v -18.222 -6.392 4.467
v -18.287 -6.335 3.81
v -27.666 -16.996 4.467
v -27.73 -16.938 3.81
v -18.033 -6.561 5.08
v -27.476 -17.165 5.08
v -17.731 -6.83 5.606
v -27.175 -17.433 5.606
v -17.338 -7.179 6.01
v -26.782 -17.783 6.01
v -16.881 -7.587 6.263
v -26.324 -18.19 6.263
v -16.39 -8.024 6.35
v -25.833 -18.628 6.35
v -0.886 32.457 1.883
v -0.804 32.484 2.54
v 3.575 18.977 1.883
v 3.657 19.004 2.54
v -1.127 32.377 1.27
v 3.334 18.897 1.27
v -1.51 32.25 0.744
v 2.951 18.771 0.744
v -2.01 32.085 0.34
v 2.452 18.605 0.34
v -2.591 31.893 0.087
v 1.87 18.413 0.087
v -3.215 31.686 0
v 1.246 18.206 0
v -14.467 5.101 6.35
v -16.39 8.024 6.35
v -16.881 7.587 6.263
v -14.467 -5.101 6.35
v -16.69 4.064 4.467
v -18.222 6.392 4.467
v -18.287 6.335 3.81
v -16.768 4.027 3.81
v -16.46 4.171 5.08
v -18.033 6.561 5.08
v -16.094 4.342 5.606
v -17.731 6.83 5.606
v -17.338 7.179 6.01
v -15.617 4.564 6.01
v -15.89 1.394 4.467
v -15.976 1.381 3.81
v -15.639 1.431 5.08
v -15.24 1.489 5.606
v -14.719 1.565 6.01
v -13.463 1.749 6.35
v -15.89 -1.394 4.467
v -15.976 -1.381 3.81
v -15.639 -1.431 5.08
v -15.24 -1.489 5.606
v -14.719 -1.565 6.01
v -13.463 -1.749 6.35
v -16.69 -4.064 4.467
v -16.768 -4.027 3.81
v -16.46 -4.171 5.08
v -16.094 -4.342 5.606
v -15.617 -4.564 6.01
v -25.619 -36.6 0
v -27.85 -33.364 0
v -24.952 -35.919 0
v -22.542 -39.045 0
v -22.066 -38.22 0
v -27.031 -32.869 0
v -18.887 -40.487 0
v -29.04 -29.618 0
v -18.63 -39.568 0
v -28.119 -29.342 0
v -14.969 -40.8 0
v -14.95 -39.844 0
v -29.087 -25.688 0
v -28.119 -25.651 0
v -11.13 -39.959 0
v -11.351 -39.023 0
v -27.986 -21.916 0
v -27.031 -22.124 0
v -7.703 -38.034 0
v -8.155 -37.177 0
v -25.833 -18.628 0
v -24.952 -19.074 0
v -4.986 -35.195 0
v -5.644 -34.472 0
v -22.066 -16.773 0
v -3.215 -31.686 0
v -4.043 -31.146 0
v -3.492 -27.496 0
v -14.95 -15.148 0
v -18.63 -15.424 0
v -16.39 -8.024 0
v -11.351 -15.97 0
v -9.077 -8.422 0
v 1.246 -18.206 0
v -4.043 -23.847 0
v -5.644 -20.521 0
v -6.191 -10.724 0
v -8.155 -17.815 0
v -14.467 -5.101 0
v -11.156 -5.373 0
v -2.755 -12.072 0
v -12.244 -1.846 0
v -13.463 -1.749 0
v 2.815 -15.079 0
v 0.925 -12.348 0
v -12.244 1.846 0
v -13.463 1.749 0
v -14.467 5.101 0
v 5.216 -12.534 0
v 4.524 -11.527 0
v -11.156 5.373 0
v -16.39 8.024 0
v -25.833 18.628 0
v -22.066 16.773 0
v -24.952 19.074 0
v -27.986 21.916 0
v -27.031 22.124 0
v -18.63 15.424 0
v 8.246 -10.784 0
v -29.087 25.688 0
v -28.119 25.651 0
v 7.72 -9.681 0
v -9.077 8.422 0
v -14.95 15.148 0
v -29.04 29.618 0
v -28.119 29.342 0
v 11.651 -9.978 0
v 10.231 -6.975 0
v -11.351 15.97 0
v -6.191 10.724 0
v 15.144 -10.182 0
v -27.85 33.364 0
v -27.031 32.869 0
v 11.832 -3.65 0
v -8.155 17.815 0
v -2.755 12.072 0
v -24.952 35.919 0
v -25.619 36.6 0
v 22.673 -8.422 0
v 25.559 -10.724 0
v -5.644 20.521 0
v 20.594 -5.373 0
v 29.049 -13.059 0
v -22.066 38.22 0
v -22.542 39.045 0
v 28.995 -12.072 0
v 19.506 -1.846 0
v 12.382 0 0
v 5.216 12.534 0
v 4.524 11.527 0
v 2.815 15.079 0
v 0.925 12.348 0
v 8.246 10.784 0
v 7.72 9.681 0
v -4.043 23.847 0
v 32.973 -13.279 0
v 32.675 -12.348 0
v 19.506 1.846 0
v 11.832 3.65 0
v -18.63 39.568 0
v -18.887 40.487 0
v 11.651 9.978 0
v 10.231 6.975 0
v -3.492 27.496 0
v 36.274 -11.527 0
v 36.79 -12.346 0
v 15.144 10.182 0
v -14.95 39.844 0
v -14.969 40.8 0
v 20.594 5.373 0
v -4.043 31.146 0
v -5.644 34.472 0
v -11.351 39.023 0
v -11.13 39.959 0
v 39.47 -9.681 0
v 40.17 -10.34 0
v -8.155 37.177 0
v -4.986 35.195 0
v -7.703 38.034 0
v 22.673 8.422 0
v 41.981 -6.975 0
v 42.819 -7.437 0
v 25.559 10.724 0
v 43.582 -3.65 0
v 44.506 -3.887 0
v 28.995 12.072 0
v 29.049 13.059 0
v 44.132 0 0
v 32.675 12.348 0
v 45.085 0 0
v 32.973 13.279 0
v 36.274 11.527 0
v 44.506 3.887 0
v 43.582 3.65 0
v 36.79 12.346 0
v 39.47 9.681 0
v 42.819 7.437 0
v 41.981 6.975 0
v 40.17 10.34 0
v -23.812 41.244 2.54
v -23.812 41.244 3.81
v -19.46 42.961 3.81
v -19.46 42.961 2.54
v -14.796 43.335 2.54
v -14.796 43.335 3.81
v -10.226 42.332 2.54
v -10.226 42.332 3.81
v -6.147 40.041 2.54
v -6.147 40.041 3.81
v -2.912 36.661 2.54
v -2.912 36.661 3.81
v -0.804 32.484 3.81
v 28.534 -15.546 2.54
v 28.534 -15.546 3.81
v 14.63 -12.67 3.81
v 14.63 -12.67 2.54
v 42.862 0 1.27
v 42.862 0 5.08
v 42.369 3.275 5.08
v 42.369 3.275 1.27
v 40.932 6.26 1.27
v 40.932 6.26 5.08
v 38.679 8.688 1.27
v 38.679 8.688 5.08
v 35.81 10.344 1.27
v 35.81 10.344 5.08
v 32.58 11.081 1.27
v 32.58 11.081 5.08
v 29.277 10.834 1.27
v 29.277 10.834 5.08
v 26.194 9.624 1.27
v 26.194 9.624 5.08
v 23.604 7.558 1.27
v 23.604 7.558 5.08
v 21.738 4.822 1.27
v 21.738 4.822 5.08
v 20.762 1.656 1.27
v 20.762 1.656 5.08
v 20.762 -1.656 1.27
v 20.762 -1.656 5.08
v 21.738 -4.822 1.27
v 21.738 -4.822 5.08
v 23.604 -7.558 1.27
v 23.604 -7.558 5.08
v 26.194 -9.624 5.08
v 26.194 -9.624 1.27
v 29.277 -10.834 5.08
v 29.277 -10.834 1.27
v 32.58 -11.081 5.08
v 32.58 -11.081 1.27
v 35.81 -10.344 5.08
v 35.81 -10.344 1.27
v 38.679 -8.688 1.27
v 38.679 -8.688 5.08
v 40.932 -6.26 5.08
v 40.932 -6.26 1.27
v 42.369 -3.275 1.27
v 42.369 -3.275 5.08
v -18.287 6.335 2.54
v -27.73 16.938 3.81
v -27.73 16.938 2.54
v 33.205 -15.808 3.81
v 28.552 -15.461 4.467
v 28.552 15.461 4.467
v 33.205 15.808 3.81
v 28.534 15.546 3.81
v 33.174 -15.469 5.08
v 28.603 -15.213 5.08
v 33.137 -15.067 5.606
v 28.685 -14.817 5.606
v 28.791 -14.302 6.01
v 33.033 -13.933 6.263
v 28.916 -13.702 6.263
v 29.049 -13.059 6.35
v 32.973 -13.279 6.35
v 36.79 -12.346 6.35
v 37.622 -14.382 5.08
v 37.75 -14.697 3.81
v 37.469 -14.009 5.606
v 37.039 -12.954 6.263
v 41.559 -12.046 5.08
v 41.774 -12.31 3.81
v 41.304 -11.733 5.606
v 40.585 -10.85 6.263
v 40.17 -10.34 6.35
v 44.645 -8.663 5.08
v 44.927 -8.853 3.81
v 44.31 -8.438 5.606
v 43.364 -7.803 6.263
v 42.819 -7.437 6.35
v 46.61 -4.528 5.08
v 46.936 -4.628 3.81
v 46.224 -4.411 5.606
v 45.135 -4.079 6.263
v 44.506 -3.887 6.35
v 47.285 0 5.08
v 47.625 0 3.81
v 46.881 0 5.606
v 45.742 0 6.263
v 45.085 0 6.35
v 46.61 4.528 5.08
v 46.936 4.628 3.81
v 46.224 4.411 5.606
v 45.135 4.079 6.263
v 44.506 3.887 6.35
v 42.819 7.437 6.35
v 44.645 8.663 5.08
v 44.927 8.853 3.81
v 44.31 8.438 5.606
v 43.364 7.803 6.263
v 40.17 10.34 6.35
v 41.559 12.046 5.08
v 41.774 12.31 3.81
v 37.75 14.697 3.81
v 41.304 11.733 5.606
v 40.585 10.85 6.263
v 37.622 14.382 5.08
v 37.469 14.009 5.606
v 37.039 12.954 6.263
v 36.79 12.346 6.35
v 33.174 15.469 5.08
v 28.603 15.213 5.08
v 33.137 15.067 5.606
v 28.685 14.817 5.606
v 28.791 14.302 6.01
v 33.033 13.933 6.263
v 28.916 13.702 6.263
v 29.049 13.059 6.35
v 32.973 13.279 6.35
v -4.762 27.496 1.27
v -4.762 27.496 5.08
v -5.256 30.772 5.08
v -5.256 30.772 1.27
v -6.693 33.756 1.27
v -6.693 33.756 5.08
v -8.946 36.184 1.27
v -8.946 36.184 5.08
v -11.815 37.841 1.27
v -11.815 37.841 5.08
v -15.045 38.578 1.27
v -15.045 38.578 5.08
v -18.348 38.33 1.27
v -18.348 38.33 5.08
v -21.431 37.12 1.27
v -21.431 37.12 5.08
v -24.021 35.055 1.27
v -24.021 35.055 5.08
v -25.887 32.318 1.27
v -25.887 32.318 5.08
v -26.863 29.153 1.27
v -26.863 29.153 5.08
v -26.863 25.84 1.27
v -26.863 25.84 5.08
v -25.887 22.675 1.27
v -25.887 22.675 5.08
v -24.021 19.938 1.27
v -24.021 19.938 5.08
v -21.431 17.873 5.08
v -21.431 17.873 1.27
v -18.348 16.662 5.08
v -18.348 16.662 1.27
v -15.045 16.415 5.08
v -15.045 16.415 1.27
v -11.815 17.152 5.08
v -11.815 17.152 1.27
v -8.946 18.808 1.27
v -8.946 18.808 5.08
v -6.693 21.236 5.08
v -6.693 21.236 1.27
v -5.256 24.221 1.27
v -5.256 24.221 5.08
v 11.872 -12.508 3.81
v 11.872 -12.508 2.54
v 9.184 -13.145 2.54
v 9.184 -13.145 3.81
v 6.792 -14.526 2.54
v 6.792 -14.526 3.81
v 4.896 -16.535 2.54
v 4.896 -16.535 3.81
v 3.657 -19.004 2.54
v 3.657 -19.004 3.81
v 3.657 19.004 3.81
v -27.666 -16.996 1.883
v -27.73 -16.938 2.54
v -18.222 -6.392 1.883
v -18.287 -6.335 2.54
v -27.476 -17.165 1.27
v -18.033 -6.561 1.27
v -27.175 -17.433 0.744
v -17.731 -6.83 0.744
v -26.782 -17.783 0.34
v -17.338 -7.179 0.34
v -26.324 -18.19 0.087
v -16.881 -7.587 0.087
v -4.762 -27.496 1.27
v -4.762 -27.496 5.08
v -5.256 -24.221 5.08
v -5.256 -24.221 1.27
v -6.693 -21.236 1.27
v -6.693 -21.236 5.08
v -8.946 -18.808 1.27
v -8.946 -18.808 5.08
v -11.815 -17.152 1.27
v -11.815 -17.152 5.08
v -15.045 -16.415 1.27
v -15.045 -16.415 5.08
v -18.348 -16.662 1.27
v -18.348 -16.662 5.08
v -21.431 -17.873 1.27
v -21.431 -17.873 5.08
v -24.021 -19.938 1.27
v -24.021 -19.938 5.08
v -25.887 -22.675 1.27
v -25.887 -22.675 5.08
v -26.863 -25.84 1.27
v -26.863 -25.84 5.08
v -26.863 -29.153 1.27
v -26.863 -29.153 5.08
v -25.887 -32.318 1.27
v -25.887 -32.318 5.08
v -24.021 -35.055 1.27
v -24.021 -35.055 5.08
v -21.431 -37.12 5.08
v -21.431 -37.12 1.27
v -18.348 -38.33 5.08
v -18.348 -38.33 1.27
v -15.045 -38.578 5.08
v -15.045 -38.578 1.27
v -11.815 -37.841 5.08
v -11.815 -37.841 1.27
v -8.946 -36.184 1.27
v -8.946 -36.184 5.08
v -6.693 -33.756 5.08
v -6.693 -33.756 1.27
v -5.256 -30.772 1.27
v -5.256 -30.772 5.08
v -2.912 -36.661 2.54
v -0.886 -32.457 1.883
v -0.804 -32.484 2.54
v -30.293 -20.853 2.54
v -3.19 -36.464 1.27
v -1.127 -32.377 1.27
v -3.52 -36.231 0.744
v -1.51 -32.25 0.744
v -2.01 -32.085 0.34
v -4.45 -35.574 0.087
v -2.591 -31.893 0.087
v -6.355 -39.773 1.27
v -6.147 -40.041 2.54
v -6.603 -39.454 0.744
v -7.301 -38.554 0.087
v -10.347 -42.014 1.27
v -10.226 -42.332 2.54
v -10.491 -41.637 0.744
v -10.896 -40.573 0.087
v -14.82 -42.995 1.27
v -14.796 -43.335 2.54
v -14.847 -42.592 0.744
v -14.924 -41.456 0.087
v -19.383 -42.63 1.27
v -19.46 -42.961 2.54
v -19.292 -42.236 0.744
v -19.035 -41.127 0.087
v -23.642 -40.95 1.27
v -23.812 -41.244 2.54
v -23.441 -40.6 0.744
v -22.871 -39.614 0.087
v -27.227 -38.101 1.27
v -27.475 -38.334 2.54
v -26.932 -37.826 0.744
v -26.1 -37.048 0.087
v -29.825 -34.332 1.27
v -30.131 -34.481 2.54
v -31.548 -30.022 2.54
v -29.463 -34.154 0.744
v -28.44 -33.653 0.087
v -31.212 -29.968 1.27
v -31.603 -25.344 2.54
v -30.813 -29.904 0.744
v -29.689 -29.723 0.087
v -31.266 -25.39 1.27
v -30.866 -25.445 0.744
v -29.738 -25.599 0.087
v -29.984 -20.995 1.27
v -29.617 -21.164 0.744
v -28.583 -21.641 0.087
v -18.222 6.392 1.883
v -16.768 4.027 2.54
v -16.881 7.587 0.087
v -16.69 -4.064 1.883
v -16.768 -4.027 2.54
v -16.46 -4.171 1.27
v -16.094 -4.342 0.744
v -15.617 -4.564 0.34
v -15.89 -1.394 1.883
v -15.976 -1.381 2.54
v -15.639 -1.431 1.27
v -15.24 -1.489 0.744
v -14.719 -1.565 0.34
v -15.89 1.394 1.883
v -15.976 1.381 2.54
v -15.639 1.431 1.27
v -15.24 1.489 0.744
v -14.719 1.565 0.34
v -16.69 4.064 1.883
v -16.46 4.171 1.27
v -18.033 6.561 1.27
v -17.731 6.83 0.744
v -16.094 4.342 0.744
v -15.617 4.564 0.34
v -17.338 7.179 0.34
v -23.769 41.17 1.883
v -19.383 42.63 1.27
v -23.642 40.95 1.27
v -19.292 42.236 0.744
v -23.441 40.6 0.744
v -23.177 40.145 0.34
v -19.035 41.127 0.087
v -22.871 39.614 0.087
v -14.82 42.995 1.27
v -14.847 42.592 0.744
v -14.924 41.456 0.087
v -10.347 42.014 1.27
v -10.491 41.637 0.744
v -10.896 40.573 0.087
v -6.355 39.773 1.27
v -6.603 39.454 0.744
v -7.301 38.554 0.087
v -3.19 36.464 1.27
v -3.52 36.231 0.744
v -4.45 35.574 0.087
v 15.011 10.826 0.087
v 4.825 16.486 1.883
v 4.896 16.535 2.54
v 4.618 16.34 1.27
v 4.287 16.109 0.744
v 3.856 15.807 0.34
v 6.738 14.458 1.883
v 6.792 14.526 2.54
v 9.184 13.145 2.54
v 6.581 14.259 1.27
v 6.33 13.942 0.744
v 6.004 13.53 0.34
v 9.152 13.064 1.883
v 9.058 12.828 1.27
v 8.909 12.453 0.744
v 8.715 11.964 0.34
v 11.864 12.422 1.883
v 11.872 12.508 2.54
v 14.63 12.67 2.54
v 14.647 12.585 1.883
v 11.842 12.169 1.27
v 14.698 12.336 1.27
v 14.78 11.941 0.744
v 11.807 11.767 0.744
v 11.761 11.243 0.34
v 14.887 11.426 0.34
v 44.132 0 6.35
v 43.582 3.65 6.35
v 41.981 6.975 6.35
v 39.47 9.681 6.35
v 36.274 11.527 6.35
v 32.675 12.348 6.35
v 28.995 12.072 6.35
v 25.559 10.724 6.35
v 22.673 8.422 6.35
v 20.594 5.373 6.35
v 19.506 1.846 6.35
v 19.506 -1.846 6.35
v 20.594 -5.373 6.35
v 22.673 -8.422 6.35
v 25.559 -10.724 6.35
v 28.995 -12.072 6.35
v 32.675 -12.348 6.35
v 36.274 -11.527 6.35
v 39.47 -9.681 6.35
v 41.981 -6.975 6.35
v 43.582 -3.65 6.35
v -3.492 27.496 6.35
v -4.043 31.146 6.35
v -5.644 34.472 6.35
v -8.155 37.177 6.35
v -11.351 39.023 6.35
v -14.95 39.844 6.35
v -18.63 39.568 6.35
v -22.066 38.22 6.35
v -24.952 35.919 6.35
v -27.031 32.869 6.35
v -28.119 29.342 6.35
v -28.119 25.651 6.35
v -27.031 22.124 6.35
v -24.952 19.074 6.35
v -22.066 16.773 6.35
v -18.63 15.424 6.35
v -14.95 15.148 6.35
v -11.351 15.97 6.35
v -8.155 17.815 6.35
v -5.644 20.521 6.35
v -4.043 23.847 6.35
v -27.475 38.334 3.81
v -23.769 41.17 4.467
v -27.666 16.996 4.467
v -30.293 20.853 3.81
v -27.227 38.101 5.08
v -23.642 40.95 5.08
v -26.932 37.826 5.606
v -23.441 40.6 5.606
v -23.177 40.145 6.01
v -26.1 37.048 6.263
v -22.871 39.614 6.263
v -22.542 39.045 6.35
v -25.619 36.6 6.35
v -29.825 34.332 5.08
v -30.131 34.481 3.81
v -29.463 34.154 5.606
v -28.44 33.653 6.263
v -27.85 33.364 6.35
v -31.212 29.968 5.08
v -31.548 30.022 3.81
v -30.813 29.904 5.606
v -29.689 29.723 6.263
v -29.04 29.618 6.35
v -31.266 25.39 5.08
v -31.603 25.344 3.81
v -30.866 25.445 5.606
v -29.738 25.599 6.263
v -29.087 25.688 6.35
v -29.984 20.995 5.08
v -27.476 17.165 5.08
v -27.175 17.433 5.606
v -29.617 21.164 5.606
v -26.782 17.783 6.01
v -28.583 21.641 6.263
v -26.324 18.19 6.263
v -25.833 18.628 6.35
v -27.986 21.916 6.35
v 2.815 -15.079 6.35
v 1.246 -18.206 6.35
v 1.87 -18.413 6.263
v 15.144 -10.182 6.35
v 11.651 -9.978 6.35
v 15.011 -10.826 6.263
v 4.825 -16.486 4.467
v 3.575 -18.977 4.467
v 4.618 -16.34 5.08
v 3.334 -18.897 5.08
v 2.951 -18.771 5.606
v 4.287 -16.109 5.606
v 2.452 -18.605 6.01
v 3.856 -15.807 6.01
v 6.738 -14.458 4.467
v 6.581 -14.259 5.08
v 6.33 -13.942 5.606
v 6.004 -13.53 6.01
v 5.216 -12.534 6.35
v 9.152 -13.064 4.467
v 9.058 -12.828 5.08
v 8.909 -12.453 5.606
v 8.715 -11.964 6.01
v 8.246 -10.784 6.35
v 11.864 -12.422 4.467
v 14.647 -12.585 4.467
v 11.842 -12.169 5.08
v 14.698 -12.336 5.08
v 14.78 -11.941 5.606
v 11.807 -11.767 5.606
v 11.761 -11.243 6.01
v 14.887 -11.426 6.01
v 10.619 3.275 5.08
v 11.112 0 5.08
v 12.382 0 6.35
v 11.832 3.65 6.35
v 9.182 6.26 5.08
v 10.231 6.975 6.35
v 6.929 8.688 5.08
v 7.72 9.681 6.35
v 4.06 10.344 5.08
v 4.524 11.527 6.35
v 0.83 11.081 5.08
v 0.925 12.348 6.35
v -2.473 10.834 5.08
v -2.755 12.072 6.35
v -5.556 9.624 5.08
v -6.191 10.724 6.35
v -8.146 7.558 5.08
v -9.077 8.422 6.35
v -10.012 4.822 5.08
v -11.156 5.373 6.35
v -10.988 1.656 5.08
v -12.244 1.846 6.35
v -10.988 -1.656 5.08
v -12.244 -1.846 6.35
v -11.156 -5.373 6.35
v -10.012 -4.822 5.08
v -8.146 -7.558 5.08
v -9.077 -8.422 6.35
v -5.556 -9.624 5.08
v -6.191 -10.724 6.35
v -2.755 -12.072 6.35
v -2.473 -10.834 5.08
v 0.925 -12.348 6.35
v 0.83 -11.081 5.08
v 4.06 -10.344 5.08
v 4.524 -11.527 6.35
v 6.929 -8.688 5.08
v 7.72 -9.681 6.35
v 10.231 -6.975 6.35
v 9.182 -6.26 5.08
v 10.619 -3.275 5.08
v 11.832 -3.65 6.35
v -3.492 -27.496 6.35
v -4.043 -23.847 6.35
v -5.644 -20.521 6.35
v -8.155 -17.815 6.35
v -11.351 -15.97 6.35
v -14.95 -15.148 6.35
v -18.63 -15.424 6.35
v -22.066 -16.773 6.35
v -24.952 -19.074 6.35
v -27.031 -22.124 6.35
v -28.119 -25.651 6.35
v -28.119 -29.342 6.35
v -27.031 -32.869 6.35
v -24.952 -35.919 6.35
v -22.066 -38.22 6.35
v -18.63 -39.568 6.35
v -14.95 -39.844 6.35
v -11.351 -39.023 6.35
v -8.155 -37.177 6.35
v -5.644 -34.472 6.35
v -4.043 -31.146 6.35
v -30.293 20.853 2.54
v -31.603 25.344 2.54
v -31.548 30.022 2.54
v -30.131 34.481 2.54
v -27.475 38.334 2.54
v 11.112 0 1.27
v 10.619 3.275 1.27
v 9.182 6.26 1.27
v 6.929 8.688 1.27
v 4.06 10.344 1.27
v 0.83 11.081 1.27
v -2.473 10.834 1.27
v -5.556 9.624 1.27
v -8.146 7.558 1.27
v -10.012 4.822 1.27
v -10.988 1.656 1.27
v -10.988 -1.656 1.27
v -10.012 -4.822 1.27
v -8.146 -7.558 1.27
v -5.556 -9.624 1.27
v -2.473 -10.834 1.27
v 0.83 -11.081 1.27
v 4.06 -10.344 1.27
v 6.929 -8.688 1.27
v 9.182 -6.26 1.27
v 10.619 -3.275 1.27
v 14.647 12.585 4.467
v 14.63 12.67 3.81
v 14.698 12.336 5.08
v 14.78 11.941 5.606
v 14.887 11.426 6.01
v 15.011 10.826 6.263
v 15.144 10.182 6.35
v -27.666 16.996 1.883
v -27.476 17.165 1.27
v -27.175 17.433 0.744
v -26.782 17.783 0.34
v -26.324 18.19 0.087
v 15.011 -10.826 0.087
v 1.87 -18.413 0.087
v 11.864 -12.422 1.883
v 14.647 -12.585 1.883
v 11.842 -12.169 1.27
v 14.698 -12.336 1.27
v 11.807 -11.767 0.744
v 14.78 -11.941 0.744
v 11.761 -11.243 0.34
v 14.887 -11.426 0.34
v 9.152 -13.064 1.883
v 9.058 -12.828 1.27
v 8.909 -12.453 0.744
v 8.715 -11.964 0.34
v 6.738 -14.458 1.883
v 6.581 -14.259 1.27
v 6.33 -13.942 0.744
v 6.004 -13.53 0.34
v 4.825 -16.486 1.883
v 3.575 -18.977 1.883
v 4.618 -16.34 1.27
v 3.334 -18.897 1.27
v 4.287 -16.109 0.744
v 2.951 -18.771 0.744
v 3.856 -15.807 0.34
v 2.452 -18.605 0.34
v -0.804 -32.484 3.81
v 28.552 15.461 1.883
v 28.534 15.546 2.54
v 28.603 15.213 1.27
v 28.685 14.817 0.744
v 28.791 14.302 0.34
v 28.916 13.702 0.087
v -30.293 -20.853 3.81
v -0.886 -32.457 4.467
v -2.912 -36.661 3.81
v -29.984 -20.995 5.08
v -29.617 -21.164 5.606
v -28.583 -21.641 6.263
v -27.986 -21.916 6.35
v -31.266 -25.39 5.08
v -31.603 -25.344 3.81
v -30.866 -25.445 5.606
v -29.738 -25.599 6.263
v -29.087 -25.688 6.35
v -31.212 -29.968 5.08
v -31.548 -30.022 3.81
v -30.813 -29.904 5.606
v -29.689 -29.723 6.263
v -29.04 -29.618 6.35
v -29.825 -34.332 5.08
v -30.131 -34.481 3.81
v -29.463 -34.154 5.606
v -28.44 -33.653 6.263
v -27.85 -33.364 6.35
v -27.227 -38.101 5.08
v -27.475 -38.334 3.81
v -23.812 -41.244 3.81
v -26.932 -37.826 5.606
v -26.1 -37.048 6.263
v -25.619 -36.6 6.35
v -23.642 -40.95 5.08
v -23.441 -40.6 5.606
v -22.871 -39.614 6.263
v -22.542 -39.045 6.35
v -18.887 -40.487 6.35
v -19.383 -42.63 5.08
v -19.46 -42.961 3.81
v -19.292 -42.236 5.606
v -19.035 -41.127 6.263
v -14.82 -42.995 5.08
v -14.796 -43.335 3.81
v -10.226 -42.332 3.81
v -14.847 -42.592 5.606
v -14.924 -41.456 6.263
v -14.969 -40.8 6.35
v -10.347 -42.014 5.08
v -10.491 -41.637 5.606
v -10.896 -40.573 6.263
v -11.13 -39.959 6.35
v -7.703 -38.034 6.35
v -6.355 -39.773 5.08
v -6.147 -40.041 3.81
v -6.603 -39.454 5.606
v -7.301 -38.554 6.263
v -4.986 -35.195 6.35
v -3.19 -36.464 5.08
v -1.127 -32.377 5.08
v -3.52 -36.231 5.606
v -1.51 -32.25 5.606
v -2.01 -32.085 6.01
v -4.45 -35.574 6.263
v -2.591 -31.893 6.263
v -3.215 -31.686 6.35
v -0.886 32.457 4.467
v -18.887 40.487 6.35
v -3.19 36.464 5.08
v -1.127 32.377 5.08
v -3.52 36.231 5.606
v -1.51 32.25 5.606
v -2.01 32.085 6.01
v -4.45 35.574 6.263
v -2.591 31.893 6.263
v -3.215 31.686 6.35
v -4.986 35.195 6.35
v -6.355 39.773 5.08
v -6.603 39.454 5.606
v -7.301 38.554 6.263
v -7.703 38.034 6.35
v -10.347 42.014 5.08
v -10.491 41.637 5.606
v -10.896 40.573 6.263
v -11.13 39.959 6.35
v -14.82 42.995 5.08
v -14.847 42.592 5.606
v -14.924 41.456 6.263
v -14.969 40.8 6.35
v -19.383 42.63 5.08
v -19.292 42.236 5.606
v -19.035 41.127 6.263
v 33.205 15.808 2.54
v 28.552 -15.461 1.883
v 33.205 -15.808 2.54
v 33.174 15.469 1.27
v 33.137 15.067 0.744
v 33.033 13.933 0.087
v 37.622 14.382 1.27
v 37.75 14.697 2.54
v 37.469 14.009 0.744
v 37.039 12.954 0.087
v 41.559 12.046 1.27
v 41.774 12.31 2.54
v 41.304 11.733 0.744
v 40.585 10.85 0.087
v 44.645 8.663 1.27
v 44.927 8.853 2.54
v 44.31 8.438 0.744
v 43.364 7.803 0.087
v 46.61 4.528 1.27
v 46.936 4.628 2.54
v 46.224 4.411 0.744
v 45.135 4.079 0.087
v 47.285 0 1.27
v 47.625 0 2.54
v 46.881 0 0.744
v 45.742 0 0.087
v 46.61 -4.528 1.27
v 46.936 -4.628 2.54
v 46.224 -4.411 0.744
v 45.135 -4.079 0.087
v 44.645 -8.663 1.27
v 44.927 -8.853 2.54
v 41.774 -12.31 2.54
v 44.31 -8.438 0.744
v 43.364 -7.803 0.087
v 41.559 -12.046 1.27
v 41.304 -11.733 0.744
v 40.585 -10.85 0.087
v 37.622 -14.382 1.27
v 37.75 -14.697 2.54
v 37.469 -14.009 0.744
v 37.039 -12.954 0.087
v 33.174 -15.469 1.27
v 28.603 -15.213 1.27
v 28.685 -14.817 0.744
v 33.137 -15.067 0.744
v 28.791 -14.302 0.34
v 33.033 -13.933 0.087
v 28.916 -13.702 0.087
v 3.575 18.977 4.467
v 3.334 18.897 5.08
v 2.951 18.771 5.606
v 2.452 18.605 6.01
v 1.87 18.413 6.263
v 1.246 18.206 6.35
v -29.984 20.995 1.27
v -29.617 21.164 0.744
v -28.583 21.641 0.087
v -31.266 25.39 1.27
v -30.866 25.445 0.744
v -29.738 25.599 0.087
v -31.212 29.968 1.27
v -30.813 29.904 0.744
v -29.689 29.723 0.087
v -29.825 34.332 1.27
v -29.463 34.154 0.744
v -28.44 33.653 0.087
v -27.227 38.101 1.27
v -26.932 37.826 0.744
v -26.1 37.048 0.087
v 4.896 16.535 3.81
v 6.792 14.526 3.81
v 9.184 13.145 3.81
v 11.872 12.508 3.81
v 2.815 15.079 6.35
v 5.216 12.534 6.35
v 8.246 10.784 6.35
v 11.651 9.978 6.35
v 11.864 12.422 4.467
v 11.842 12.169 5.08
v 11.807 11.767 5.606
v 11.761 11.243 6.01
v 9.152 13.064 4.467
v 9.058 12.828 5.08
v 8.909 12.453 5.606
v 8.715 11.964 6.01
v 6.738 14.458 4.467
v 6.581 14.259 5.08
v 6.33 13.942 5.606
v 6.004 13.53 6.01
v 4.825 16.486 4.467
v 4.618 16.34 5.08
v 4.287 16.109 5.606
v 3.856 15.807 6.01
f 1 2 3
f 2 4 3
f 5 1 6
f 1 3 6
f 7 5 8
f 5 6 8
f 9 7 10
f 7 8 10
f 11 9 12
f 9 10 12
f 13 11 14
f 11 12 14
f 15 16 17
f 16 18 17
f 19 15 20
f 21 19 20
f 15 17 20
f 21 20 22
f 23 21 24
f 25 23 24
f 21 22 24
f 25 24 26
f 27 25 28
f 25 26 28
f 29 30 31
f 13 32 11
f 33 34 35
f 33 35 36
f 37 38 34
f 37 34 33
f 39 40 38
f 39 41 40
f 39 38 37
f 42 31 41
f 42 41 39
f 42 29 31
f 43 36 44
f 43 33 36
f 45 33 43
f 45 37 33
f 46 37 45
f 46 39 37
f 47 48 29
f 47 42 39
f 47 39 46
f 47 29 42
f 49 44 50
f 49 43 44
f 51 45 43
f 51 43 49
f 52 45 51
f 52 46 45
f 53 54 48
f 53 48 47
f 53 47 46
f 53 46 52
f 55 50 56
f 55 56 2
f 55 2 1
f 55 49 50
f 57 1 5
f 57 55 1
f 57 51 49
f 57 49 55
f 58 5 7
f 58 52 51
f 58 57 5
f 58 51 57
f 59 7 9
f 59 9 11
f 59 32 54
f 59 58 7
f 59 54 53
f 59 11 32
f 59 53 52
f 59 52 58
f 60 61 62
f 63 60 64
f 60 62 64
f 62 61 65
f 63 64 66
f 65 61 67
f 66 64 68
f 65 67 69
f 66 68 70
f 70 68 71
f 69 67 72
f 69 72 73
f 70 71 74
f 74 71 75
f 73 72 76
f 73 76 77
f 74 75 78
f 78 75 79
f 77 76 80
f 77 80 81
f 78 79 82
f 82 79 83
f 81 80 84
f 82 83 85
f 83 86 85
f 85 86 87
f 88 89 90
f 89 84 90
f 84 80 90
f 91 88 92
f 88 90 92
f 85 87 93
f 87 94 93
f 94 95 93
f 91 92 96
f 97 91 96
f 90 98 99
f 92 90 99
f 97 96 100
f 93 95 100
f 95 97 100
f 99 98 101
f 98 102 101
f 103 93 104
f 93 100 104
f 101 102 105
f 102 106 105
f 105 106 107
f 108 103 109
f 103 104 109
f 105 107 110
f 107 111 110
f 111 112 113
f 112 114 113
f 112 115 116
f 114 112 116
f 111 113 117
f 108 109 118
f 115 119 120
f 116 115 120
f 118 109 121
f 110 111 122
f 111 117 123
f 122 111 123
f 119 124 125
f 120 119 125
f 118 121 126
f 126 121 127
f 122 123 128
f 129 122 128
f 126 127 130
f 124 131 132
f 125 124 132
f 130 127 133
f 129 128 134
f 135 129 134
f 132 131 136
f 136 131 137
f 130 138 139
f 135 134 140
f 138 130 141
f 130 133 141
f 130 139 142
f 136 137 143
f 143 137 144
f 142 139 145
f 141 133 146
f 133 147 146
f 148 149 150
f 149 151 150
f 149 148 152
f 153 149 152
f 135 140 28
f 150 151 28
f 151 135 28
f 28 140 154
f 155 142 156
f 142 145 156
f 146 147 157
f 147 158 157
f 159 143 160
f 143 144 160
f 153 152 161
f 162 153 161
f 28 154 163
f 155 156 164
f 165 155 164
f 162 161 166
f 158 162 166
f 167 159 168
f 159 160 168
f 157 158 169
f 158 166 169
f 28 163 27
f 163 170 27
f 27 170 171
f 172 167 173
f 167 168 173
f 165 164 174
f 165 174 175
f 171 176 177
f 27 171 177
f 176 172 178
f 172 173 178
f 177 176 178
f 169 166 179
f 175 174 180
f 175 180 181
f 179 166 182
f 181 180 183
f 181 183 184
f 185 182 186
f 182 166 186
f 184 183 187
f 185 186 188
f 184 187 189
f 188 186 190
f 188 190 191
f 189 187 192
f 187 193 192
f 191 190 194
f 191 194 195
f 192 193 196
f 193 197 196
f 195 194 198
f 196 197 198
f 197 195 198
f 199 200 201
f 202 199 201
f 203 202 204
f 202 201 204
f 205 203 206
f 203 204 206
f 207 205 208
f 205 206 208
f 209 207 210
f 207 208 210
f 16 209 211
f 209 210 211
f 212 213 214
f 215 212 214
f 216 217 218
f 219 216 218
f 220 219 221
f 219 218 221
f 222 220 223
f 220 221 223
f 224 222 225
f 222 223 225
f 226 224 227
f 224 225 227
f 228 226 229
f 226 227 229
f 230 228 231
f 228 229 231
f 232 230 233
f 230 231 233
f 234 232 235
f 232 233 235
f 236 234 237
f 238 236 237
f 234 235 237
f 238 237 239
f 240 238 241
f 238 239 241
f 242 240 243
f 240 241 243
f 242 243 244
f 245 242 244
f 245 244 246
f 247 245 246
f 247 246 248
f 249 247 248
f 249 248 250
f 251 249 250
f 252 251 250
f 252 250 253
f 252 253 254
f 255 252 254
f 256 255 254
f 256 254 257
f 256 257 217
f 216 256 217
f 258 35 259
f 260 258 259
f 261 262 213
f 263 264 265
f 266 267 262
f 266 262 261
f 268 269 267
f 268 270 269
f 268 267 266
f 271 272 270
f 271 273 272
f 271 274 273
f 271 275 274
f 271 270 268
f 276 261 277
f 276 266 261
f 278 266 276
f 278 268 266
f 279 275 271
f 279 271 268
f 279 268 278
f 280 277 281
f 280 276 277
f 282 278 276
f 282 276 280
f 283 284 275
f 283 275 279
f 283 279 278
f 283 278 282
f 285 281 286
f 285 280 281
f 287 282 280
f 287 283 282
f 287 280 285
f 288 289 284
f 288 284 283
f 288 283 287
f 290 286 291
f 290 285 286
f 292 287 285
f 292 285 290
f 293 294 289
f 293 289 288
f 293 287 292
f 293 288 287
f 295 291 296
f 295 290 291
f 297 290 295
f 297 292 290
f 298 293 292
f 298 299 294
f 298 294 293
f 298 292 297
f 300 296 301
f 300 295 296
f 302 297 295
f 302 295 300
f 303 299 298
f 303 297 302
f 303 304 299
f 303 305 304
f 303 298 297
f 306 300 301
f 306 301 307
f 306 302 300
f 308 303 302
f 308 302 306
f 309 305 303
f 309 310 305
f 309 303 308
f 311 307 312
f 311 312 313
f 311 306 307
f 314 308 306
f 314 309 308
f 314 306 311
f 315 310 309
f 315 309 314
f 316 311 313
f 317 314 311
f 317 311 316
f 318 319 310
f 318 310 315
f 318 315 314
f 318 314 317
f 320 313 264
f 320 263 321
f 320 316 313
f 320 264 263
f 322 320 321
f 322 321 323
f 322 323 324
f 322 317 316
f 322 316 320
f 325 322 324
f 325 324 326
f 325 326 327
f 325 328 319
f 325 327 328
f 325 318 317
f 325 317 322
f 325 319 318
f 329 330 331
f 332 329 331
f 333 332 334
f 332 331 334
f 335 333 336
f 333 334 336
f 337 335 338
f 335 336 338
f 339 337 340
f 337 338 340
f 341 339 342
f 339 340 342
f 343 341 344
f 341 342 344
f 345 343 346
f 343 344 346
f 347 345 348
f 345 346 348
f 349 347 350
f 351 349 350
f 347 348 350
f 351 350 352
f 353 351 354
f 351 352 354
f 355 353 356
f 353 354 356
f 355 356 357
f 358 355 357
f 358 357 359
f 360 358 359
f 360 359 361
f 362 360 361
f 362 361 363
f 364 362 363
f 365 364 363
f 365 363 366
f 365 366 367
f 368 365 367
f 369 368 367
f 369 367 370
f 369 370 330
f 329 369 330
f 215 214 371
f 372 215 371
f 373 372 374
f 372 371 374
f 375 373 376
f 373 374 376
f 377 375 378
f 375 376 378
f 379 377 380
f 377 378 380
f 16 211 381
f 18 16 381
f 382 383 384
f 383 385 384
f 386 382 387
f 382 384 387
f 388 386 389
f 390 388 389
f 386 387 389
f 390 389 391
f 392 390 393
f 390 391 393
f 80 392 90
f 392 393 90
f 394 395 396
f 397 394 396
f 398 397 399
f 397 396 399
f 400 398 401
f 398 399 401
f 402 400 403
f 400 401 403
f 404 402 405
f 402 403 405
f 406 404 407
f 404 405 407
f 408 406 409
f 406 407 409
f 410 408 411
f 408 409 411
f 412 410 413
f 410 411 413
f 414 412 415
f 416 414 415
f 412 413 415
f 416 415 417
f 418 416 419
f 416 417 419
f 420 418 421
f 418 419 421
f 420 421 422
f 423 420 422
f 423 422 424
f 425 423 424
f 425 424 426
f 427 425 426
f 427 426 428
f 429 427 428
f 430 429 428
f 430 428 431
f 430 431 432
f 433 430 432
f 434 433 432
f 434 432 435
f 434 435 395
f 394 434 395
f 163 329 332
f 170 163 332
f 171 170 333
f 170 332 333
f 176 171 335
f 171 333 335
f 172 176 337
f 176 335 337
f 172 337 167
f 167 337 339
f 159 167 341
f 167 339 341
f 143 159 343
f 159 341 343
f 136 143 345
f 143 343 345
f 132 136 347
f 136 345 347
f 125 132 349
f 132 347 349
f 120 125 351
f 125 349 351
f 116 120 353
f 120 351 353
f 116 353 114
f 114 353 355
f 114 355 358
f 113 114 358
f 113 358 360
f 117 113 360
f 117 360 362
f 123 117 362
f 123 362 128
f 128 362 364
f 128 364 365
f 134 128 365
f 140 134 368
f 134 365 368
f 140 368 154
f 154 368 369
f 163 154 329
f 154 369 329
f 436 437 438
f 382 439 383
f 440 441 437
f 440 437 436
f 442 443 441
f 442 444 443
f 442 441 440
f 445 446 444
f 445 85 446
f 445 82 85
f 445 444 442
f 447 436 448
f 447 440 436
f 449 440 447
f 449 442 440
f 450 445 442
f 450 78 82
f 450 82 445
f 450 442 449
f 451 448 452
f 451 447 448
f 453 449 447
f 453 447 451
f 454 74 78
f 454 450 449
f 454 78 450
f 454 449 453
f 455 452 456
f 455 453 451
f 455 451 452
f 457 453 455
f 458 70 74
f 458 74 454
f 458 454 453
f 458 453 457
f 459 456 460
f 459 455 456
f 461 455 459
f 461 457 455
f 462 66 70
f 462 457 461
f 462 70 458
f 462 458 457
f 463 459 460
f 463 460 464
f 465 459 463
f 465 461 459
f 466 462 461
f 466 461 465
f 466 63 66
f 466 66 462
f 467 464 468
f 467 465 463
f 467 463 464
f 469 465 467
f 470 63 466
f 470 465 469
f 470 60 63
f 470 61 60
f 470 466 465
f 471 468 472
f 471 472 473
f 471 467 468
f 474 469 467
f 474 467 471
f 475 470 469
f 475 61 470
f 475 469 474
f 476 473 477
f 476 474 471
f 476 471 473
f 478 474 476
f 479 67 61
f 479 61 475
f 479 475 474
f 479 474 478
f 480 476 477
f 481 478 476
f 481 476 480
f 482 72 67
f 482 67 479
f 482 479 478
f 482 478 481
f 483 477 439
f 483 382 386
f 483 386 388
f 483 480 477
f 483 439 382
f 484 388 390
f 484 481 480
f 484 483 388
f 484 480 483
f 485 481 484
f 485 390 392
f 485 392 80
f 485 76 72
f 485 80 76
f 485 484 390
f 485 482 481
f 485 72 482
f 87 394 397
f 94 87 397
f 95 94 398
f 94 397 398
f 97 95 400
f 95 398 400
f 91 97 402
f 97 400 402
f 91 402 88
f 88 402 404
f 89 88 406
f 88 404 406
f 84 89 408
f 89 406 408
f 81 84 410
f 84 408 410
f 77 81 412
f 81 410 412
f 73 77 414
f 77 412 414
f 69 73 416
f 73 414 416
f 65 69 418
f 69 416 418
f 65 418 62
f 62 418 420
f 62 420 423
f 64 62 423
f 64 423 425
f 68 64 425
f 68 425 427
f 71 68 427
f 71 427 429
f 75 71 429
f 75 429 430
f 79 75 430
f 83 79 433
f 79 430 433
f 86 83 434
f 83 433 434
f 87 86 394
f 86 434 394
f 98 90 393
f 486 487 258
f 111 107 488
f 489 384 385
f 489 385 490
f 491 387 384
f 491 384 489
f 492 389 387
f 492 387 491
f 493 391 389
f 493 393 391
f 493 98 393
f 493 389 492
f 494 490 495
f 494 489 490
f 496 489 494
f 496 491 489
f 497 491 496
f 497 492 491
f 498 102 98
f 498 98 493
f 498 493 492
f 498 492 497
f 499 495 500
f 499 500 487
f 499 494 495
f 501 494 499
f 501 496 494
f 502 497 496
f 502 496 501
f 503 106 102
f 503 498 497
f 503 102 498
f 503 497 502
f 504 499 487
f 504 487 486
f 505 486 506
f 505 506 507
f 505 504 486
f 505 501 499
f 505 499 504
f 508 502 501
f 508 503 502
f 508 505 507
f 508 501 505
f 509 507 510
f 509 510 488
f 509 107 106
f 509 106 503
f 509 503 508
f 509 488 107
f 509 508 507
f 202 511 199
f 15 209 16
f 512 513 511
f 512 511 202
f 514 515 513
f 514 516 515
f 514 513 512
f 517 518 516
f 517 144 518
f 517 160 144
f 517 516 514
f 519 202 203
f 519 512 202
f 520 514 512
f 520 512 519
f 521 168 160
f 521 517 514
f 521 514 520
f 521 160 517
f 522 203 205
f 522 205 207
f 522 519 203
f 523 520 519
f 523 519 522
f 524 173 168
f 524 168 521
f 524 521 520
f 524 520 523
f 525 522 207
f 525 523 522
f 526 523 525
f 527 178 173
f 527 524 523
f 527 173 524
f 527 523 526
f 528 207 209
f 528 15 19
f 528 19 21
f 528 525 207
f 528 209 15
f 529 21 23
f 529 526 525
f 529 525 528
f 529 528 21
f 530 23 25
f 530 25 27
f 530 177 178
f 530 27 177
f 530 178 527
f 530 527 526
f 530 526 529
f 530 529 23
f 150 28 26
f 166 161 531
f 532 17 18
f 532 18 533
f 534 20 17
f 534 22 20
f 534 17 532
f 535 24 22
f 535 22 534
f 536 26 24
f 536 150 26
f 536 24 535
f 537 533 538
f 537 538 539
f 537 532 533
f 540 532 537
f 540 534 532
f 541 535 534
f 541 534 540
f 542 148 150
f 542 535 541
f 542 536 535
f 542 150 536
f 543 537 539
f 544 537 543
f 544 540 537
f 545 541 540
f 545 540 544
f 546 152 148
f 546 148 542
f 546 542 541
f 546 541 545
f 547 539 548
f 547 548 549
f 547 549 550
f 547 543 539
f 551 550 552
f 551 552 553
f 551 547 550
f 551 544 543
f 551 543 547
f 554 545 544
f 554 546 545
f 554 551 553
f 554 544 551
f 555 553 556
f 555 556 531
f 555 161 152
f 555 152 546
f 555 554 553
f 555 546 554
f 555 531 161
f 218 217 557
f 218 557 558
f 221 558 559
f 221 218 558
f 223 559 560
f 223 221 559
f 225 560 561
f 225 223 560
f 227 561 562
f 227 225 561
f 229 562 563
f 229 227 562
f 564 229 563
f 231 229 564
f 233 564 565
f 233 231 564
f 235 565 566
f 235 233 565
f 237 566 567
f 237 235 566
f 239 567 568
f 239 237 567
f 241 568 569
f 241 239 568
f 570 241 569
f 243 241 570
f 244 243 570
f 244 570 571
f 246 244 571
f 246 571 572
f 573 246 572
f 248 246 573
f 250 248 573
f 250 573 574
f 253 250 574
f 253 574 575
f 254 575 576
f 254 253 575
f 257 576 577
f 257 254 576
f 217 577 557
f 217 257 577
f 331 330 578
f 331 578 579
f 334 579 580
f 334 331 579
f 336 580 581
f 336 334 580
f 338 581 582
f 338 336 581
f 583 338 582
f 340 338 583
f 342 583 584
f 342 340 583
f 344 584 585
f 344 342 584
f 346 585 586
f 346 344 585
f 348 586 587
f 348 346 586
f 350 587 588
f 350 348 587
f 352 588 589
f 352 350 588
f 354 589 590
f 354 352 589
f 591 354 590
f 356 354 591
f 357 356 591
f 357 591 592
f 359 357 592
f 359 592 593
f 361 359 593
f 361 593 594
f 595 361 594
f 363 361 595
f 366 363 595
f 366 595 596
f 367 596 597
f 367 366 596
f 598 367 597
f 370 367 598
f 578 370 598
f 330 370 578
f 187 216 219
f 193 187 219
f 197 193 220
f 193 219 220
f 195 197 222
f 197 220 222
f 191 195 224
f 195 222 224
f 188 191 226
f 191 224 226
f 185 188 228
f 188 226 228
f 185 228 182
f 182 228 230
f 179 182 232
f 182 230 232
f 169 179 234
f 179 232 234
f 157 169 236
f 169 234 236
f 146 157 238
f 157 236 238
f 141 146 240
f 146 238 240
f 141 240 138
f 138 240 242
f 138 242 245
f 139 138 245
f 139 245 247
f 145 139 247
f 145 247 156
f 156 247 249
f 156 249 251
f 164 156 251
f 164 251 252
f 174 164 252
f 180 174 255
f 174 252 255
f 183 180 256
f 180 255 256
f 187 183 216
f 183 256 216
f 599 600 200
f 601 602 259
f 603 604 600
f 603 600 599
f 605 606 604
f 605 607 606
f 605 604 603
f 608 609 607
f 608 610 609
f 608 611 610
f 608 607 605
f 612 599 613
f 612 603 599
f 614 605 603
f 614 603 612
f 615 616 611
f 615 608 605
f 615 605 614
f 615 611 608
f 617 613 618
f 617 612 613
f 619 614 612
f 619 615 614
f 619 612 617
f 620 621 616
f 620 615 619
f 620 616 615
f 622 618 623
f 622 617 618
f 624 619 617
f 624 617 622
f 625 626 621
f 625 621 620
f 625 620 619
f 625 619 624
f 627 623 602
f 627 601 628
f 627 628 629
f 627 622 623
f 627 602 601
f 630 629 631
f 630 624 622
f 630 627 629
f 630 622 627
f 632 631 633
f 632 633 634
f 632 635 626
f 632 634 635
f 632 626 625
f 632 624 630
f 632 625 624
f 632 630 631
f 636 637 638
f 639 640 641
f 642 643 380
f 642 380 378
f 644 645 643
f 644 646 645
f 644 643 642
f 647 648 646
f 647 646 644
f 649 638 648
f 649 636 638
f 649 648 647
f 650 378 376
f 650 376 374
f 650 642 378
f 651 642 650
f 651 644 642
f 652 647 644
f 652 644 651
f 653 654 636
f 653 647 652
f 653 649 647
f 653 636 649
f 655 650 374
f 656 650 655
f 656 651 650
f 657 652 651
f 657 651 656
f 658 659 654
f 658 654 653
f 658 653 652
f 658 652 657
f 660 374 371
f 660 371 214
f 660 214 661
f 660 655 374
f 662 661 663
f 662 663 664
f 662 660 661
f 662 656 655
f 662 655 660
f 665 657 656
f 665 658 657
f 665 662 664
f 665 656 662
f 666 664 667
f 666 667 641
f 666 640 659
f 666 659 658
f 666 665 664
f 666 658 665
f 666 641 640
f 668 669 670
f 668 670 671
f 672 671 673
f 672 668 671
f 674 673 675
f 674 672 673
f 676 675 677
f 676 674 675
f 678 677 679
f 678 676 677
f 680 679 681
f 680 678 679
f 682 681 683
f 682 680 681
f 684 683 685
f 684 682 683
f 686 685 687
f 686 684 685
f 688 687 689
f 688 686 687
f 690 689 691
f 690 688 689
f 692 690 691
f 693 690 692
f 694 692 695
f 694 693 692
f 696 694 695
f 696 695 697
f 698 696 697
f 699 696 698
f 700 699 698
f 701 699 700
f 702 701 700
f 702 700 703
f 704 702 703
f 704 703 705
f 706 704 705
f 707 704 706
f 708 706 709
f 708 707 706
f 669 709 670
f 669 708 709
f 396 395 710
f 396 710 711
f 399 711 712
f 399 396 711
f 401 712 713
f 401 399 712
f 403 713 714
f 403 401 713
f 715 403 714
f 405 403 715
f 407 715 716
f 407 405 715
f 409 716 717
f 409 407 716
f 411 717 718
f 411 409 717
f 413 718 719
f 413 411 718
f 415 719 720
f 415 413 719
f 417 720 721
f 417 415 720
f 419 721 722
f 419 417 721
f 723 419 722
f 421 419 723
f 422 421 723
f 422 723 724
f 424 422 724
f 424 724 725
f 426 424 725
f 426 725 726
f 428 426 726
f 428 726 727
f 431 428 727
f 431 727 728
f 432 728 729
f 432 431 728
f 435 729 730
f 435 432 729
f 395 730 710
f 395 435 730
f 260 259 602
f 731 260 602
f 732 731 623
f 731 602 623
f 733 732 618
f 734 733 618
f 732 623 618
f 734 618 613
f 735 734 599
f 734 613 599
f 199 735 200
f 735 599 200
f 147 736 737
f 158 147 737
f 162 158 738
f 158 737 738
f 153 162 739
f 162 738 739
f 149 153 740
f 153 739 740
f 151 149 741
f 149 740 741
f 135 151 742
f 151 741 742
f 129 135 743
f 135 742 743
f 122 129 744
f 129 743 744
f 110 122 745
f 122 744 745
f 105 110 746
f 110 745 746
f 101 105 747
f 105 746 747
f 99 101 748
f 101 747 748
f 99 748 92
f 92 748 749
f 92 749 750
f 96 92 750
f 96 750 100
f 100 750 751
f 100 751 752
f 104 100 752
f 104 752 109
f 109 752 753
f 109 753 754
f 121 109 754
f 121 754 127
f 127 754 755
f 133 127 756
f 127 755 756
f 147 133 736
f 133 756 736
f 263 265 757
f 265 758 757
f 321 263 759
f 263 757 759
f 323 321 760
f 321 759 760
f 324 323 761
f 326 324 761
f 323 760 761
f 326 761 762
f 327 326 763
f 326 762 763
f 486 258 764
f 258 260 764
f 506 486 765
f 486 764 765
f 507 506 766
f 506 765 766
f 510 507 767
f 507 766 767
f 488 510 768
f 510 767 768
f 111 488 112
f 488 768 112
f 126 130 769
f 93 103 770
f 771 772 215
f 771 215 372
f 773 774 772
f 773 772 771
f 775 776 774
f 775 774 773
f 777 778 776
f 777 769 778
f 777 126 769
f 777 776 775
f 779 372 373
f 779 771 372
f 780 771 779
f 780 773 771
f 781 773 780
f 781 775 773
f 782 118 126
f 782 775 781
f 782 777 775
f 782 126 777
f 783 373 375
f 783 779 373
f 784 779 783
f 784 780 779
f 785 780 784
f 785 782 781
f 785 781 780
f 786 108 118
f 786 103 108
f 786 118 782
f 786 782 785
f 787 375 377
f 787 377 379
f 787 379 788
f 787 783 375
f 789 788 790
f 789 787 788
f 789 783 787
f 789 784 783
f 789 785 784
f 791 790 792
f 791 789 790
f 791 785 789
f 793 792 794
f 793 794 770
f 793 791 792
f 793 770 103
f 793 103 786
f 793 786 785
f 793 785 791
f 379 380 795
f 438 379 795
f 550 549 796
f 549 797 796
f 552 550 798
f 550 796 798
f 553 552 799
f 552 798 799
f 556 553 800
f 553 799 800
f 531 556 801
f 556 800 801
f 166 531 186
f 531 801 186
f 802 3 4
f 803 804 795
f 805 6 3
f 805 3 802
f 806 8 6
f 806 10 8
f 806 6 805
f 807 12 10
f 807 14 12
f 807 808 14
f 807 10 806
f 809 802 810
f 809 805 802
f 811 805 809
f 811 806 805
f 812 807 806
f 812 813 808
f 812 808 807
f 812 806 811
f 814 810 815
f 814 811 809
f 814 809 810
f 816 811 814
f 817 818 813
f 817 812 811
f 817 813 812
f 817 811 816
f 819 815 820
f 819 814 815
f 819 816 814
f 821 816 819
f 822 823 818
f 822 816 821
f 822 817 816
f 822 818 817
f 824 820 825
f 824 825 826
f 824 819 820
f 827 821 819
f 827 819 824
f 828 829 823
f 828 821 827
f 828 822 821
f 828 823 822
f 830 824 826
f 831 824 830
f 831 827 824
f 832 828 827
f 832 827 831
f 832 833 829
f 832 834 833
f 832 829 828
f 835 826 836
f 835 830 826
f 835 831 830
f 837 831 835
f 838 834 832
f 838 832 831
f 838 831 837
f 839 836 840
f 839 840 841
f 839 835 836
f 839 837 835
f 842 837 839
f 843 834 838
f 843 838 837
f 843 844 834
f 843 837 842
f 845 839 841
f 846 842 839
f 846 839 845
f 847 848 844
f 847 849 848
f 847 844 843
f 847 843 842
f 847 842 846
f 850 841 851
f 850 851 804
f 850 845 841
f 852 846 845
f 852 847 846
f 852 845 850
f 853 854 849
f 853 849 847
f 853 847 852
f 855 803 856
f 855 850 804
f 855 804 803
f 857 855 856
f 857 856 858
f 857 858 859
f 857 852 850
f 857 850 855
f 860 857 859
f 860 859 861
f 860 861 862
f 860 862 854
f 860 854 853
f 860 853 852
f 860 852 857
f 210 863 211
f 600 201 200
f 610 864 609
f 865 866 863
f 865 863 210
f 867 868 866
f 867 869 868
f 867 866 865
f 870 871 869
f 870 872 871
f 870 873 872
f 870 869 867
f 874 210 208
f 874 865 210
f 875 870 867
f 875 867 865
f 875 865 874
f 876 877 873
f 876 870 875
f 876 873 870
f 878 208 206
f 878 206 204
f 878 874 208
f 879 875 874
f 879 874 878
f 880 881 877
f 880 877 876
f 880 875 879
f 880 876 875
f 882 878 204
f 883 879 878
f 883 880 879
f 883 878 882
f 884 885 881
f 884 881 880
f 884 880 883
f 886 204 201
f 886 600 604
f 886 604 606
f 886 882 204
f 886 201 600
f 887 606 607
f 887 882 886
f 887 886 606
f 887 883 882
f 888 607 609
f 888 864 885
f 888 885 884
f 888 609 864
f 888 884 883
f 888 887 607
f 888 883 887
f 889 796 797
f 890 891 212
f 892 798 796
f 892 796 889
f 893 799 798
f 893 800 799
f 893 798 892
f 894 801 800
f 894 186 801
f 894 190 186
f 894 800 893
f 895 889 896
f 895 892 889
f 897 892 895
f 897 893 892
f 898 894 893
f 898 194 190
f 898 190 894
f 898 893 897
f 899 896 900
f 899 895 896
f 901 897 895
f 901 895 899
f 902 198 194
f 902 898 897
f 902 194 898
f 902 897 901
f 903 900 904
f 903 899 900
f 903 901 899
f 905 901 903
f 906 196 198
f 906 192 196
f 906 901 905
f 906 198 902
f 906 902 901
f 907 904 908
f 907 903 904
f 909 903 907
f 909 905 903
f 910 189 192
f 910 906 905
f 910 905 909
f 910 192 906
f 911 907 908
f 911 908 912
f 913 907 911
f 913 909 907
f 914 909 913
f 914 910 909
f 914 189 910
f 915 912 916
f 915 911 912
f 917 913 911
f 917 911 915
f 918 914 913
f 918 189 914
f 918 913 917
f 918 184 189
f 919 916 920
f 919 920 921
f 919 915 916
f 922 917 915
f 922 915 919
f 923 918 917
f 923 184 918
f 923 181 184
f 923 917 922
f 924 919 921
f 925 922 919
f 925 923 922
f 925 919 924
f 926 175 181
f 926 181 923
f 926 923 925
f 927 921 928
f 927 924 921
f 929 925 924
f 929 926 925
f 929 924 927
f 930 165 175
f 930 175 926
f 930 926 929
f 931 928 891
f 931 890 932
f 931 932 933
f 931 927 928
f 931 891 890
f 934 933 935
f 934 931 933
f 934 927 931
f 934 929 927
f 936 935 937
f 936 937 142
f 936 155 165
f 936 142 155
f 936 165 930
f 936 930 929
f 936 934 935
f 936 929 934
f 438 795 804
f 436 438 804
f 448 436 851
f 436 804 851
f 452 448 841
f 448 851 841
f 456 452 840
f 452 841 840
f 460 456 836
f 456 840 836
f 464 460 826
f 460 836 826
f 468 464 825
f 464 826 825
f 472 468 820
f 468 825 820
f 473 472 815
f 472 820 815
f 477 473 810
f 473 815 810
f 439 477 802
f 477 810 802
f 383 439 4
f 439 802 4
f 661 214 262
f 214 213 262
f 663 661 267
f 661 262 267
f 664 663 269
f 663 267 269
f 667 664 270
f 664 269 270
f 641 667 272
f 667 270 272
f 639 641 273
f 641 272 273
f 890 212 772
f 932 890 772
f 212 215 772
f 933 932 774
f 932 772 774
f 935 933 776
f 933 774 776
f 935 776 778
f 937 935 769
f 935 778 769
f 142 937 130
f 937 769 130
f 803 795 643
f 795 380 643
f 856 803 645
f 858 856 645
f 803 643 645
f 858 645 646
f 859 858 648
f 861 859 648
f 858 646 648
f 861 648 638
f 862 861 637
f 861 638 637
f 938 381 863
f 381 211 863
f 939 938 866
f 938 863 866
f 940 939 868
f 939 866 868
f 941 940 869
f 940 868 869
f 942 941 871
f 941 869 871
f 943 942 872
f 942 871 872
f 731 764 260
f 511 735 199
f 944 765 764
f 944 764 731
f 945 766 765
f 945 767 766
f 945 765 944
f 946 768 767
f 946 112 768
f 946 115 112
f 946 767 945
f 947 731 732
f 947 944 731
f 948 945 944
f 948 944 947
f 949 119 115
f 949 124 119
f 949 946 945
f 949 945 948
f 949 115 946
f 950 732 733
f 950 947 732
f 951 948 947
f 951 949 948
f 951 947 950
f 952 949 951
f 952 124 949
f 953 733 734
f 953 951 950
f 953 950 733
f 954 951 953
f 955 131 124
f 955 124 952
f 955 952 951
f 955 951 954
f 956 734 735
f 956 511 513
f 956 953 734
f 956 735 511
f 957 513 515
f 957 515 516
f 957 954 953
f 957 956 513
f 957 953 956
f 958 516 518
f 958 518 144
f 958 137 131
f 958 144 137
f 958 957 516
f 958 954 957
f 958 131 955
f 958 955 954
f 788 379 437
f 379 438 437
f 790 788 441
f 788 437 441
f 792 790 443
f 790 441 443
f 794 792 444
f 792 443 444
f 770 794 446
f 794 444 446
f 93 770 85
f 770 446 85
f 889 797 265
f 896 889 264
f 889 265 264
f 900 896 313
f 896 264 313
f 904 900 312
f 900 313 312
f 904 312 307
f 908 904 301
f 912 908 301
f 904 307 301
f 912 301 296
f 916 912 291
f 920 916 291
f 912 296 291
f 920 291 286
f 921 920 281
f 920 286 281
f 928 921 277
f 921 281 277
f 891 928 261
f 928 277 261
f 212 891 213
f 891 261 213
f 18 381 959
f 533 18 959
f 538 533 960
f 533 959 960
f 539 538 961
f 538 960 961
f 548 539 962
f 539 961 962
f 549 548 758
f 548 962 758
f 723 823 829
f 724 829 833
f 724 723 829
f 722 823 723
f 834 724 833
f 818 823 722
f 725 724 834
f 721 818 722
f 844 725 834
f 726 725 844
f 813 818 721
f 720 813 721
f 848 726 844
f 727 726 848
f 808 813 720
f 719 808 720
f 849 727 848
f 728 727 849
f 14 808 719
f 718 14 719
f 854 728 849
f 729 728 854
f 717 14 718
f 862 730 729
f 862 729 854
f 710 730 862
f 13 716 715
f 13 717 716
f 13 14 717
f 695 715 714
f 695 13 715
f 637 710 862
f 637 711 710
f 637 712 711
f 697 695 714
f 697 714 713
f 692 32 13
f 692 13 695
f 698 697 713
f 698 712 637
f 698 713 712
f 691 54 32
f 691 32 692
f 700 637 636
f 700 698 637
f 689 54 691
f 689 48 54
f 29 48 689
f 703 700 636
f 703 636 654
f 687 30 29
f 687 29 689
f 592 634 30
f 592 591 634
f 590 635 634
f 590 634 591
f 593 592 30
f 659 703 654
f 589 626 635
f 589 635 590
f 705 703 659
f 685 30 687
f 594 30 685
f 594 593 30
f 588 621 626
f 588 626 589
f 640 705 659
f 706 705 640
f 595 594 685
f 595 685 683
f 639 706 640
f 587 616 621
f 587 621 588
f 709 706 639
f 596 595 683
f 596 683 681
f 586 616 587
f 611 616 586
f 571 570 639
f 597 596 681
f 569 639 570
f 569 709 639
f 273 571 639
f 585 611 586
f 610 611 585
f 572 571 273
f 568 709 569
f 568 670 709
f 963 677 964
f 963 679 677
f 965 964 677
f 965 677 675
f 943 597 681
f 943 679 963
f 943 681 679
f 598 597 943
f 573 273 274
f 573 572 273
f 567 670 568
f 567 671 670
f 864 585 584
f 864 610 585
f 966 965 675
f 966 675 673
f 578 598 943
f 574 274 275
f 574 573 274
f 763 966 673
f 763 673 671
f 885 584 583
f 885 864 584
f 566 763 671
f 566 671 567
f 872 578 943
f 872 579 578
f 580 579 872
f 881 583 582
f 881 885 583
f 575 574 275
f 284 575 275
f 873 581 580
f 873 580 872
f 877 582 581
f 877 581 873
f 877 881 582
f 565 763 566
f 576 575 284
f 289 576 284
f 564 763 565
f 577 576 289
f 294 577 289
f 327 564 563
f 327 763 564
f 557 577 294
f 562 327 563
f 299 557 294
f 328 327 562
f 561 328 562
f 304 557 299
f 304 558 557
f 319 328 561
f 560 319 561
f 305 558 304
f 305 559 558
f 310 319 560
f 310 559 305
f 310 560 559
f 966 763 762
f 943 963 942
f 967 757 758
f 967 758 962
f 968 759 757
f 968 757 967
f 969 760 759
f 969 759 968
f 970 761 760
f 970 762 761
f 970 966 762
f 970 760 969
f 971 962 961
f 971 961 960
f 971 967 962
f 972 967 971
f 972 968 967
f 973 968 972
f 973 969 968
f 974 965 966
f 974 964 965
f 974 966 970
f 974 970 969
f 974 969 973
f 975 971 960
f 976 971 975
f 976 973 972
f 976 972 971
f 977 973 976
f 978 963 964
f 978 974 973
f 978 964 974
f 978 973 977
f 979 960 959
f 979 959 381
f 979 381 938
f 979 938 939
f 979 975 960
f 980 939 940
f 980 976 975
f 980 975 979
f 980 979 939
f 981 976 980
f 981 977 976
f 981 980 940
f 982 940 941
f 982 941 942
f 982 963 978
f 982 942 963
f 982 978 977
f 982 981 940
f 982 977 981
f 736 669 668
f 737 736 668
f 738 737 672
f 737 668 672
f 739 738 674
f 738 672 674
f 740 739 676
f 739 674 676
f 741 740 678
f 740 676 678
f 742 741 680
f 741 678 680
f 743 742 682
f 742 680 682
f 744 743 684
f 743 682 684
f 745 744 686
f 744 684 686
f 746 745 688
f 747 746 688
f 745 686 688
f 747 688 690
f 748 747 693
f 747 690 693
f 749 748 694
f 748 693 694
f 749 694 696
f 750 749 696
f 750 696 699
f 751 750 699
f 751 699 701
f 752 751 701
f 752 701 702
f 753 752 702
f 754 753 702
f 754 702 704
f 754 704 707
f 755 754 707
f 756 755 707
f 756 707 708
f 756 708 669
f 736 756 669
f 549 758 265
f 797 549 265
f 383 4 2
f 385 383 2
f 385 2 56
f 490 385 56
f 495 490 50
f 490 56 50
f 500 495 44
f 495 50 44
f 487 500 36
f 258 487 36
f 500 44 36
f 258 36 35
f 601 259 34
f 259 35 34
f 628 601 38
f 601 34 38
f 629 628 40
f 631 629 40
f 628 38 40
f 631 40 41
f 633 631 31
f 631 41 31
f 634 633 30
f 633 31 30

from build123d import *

# Parameters (mm, degrees)
F0_R     = 47.625
F1_DEPTH = 6.35
F2_R     = 11.1125
F3_DEPTH = 6.351
F4_R     = 9.525
F5_DEPTH = 6.351
F6_R     = 56.6626393047
F7_DEPTH = 6.351
F8_R     = 2.54
F9_SIZE  = 1.27


with BuildPart() as f1:
    # F0 (on Top) → F1 (new body)
    with BuildSketch(Plane.XY):
        Circle(F0_R)
    extrude(amount=F1_DEPTH)

    # F2 (on face) → F3 (cut, through all)
    with BuildSketch(Plane.XY.offset(6.35)):
        with Locations((-15.875, -27.4963065702)):
            Circle(F2_R)
        Circle(F2_R)
        with Locations((31.75, 0)):
            Circle(F2_R)
        with Locations((-15.875, 27.4963065702)):
            Circle(F2_R)
    extrude(amount=-F3_DEPTH, mode=Mode.SUBTRACT)

    # F4 (on face) → F5 (cut, through all)
    with BuildSketch(Plane.XY.offset(6.35)):
        with Locations((12.7, 21.9970452561)):
            Circle(F4_R)
        with Locations((-25.4, 0)):
            Circle(F4_R)
        with Locations((12.7, -21.9970452561)):
            Circle(F4_R)
    extrude(amount=-F5_DEPTH, mode=Mode.SUBTRACT)

    # F6 (on face) → F7 (cut, through all)
    with BuildSketch(Plane.XY.offset(6.35)):
        Circle(F6_R)
        with BuildLine():
            ThreePointArc((-23.8124980446, 41.2444609842), (23.8125009777, 41.2444592907), (47.625, 0))
            ThreePointArc((47.625, 0), (23.8125012223, -41.2444591495), (-23.8124975554, -41.2444612666))
            ThreePointArc((-23.8124975554, -41.2444612666), (-47.625, -2.824e-07), (-23.8124980446, 41.2444609842))
        make_face(mode=Mode.SUBTRACT)
        with BuildLine():
            ThreePointArc((-27.7301917406, 16.9383686184), (-31.5477206878, 30.0224600182), (-23.8124980446, 41.2444609842))
            ThreePointArc((-23.8124980446, 41.2444609842), (-47.625, -2.824e-07), (-23.8124975554, -41.2444612666))
            ThreePointArc((-23.8124975554, -41.2444612666), (-31.5477206428, -30.022460297), (-27.7301917406, -16.9383686184))
            Line((-27.7301917406, -16.9383686184), (-18.2868849556, -6.3347627711))
            ThreePointArc((-18.2868849556, -6.3347627711), (-34.925, 0), (-18.2868849556, 6.3347627711))
            Line((-18.2868849556, 6.3347627711), (-27.7301917406, 16.9383686184))
        make_face()
        with BuildLine():
            ThreePointArc((47.625, 0), (41.7740725283, -12.3098982509), (28.5341533925, -15.54586619))
            Line((28.5341533925, -15.54586619), (14.6295079645, -12.6695255421))
            ThreePointArc((14.6295079645, -12.6695255421), (20.0859389505, -15.9826017391), (22.225, -21.9970452561))
            ThreePointArc((22.225, -21.9970452561), (11.1843085999, -31.4006777766), (3.6573769911, -19.0042883132))
            Line((3.6573769911, -19.0042883132), (-0.8039616519, -32.4842348084))
            ThreePointArc((-0.8039616519, -32.4842348084), (-10.2263503419, -42.3323566523), (-23.8124975554, -41.2444612666))
            ThreePointArc((-23.8124975554, -41.2444612666), (23.8125012223, -41.2444591495), (47.625, 0))
        make_face()
        with BuildLine():
            ThreePointArc((28.5341533925, 15.54586619), (41.7740725283, 12.3098982509), (47.625, 0))
            ThreePointArc((47.625, 0), (23.8125009777, 41.2444592907), (-23.8124980446, 41.2444609842))
            ThreePointArc((-23.8124980446, 41.2444609842), (-10.2263506058, 42.3323567528), (-0.8039616519, 32.4842348084))
            Line((-0.8039616519, 32.4842348084), (3.6573769911, 19.0042883132))
            ThreePointArc((3.6573769911, 19.0042883132), (11.1843085999, 31.4006777766), (22.225, 21.9970452561))
            ThreePointArc((22.225, 21.9970452561), (20.0859389505, 15.9826017391), (14.6295079645, 12.6695255421))
            Line((14.6295079645, 12.6695255421), (28.5341533925, 15.54586619))
        make_face()
    extrude(amount=-F7_DEPTH, mode=Mode.SUBTRACT)

    # F8
    f8_edges = [f1.edges().sort_by_distance(p)[0] for p in [
        (-23.8125, -41.24446, 6.35),
        (1.426708, -25.744262, 6.35),
        (7.9375, -13.748153, 0),
    ]]
    fillet(f8_edges, radius=F8_R)

    # F9
    f9_edges = [f1.edges().sort_by_distance(p)[0] for p in [
        (-26.9875, -27.496307, 6.35),
        (-26.9875, -27.496307, 0),
        (-11.1125, 0, 0),
        (-11.1125, 0, 6.35),
        (-26.9875, 27.496307, 0),
        (-26.9875, 27.496307, 6.35),
        (20.6375, 0, 0),
        (20.6375, 0, 6.35),
    ]]
    chamfer(f9_edges, length=F9_SIZE)


with BuildPart() as f10_1:
    # F10: copy of F1
    add(f1.part.moved(Location((76.2, 0, 0))))


solid = f1.part
